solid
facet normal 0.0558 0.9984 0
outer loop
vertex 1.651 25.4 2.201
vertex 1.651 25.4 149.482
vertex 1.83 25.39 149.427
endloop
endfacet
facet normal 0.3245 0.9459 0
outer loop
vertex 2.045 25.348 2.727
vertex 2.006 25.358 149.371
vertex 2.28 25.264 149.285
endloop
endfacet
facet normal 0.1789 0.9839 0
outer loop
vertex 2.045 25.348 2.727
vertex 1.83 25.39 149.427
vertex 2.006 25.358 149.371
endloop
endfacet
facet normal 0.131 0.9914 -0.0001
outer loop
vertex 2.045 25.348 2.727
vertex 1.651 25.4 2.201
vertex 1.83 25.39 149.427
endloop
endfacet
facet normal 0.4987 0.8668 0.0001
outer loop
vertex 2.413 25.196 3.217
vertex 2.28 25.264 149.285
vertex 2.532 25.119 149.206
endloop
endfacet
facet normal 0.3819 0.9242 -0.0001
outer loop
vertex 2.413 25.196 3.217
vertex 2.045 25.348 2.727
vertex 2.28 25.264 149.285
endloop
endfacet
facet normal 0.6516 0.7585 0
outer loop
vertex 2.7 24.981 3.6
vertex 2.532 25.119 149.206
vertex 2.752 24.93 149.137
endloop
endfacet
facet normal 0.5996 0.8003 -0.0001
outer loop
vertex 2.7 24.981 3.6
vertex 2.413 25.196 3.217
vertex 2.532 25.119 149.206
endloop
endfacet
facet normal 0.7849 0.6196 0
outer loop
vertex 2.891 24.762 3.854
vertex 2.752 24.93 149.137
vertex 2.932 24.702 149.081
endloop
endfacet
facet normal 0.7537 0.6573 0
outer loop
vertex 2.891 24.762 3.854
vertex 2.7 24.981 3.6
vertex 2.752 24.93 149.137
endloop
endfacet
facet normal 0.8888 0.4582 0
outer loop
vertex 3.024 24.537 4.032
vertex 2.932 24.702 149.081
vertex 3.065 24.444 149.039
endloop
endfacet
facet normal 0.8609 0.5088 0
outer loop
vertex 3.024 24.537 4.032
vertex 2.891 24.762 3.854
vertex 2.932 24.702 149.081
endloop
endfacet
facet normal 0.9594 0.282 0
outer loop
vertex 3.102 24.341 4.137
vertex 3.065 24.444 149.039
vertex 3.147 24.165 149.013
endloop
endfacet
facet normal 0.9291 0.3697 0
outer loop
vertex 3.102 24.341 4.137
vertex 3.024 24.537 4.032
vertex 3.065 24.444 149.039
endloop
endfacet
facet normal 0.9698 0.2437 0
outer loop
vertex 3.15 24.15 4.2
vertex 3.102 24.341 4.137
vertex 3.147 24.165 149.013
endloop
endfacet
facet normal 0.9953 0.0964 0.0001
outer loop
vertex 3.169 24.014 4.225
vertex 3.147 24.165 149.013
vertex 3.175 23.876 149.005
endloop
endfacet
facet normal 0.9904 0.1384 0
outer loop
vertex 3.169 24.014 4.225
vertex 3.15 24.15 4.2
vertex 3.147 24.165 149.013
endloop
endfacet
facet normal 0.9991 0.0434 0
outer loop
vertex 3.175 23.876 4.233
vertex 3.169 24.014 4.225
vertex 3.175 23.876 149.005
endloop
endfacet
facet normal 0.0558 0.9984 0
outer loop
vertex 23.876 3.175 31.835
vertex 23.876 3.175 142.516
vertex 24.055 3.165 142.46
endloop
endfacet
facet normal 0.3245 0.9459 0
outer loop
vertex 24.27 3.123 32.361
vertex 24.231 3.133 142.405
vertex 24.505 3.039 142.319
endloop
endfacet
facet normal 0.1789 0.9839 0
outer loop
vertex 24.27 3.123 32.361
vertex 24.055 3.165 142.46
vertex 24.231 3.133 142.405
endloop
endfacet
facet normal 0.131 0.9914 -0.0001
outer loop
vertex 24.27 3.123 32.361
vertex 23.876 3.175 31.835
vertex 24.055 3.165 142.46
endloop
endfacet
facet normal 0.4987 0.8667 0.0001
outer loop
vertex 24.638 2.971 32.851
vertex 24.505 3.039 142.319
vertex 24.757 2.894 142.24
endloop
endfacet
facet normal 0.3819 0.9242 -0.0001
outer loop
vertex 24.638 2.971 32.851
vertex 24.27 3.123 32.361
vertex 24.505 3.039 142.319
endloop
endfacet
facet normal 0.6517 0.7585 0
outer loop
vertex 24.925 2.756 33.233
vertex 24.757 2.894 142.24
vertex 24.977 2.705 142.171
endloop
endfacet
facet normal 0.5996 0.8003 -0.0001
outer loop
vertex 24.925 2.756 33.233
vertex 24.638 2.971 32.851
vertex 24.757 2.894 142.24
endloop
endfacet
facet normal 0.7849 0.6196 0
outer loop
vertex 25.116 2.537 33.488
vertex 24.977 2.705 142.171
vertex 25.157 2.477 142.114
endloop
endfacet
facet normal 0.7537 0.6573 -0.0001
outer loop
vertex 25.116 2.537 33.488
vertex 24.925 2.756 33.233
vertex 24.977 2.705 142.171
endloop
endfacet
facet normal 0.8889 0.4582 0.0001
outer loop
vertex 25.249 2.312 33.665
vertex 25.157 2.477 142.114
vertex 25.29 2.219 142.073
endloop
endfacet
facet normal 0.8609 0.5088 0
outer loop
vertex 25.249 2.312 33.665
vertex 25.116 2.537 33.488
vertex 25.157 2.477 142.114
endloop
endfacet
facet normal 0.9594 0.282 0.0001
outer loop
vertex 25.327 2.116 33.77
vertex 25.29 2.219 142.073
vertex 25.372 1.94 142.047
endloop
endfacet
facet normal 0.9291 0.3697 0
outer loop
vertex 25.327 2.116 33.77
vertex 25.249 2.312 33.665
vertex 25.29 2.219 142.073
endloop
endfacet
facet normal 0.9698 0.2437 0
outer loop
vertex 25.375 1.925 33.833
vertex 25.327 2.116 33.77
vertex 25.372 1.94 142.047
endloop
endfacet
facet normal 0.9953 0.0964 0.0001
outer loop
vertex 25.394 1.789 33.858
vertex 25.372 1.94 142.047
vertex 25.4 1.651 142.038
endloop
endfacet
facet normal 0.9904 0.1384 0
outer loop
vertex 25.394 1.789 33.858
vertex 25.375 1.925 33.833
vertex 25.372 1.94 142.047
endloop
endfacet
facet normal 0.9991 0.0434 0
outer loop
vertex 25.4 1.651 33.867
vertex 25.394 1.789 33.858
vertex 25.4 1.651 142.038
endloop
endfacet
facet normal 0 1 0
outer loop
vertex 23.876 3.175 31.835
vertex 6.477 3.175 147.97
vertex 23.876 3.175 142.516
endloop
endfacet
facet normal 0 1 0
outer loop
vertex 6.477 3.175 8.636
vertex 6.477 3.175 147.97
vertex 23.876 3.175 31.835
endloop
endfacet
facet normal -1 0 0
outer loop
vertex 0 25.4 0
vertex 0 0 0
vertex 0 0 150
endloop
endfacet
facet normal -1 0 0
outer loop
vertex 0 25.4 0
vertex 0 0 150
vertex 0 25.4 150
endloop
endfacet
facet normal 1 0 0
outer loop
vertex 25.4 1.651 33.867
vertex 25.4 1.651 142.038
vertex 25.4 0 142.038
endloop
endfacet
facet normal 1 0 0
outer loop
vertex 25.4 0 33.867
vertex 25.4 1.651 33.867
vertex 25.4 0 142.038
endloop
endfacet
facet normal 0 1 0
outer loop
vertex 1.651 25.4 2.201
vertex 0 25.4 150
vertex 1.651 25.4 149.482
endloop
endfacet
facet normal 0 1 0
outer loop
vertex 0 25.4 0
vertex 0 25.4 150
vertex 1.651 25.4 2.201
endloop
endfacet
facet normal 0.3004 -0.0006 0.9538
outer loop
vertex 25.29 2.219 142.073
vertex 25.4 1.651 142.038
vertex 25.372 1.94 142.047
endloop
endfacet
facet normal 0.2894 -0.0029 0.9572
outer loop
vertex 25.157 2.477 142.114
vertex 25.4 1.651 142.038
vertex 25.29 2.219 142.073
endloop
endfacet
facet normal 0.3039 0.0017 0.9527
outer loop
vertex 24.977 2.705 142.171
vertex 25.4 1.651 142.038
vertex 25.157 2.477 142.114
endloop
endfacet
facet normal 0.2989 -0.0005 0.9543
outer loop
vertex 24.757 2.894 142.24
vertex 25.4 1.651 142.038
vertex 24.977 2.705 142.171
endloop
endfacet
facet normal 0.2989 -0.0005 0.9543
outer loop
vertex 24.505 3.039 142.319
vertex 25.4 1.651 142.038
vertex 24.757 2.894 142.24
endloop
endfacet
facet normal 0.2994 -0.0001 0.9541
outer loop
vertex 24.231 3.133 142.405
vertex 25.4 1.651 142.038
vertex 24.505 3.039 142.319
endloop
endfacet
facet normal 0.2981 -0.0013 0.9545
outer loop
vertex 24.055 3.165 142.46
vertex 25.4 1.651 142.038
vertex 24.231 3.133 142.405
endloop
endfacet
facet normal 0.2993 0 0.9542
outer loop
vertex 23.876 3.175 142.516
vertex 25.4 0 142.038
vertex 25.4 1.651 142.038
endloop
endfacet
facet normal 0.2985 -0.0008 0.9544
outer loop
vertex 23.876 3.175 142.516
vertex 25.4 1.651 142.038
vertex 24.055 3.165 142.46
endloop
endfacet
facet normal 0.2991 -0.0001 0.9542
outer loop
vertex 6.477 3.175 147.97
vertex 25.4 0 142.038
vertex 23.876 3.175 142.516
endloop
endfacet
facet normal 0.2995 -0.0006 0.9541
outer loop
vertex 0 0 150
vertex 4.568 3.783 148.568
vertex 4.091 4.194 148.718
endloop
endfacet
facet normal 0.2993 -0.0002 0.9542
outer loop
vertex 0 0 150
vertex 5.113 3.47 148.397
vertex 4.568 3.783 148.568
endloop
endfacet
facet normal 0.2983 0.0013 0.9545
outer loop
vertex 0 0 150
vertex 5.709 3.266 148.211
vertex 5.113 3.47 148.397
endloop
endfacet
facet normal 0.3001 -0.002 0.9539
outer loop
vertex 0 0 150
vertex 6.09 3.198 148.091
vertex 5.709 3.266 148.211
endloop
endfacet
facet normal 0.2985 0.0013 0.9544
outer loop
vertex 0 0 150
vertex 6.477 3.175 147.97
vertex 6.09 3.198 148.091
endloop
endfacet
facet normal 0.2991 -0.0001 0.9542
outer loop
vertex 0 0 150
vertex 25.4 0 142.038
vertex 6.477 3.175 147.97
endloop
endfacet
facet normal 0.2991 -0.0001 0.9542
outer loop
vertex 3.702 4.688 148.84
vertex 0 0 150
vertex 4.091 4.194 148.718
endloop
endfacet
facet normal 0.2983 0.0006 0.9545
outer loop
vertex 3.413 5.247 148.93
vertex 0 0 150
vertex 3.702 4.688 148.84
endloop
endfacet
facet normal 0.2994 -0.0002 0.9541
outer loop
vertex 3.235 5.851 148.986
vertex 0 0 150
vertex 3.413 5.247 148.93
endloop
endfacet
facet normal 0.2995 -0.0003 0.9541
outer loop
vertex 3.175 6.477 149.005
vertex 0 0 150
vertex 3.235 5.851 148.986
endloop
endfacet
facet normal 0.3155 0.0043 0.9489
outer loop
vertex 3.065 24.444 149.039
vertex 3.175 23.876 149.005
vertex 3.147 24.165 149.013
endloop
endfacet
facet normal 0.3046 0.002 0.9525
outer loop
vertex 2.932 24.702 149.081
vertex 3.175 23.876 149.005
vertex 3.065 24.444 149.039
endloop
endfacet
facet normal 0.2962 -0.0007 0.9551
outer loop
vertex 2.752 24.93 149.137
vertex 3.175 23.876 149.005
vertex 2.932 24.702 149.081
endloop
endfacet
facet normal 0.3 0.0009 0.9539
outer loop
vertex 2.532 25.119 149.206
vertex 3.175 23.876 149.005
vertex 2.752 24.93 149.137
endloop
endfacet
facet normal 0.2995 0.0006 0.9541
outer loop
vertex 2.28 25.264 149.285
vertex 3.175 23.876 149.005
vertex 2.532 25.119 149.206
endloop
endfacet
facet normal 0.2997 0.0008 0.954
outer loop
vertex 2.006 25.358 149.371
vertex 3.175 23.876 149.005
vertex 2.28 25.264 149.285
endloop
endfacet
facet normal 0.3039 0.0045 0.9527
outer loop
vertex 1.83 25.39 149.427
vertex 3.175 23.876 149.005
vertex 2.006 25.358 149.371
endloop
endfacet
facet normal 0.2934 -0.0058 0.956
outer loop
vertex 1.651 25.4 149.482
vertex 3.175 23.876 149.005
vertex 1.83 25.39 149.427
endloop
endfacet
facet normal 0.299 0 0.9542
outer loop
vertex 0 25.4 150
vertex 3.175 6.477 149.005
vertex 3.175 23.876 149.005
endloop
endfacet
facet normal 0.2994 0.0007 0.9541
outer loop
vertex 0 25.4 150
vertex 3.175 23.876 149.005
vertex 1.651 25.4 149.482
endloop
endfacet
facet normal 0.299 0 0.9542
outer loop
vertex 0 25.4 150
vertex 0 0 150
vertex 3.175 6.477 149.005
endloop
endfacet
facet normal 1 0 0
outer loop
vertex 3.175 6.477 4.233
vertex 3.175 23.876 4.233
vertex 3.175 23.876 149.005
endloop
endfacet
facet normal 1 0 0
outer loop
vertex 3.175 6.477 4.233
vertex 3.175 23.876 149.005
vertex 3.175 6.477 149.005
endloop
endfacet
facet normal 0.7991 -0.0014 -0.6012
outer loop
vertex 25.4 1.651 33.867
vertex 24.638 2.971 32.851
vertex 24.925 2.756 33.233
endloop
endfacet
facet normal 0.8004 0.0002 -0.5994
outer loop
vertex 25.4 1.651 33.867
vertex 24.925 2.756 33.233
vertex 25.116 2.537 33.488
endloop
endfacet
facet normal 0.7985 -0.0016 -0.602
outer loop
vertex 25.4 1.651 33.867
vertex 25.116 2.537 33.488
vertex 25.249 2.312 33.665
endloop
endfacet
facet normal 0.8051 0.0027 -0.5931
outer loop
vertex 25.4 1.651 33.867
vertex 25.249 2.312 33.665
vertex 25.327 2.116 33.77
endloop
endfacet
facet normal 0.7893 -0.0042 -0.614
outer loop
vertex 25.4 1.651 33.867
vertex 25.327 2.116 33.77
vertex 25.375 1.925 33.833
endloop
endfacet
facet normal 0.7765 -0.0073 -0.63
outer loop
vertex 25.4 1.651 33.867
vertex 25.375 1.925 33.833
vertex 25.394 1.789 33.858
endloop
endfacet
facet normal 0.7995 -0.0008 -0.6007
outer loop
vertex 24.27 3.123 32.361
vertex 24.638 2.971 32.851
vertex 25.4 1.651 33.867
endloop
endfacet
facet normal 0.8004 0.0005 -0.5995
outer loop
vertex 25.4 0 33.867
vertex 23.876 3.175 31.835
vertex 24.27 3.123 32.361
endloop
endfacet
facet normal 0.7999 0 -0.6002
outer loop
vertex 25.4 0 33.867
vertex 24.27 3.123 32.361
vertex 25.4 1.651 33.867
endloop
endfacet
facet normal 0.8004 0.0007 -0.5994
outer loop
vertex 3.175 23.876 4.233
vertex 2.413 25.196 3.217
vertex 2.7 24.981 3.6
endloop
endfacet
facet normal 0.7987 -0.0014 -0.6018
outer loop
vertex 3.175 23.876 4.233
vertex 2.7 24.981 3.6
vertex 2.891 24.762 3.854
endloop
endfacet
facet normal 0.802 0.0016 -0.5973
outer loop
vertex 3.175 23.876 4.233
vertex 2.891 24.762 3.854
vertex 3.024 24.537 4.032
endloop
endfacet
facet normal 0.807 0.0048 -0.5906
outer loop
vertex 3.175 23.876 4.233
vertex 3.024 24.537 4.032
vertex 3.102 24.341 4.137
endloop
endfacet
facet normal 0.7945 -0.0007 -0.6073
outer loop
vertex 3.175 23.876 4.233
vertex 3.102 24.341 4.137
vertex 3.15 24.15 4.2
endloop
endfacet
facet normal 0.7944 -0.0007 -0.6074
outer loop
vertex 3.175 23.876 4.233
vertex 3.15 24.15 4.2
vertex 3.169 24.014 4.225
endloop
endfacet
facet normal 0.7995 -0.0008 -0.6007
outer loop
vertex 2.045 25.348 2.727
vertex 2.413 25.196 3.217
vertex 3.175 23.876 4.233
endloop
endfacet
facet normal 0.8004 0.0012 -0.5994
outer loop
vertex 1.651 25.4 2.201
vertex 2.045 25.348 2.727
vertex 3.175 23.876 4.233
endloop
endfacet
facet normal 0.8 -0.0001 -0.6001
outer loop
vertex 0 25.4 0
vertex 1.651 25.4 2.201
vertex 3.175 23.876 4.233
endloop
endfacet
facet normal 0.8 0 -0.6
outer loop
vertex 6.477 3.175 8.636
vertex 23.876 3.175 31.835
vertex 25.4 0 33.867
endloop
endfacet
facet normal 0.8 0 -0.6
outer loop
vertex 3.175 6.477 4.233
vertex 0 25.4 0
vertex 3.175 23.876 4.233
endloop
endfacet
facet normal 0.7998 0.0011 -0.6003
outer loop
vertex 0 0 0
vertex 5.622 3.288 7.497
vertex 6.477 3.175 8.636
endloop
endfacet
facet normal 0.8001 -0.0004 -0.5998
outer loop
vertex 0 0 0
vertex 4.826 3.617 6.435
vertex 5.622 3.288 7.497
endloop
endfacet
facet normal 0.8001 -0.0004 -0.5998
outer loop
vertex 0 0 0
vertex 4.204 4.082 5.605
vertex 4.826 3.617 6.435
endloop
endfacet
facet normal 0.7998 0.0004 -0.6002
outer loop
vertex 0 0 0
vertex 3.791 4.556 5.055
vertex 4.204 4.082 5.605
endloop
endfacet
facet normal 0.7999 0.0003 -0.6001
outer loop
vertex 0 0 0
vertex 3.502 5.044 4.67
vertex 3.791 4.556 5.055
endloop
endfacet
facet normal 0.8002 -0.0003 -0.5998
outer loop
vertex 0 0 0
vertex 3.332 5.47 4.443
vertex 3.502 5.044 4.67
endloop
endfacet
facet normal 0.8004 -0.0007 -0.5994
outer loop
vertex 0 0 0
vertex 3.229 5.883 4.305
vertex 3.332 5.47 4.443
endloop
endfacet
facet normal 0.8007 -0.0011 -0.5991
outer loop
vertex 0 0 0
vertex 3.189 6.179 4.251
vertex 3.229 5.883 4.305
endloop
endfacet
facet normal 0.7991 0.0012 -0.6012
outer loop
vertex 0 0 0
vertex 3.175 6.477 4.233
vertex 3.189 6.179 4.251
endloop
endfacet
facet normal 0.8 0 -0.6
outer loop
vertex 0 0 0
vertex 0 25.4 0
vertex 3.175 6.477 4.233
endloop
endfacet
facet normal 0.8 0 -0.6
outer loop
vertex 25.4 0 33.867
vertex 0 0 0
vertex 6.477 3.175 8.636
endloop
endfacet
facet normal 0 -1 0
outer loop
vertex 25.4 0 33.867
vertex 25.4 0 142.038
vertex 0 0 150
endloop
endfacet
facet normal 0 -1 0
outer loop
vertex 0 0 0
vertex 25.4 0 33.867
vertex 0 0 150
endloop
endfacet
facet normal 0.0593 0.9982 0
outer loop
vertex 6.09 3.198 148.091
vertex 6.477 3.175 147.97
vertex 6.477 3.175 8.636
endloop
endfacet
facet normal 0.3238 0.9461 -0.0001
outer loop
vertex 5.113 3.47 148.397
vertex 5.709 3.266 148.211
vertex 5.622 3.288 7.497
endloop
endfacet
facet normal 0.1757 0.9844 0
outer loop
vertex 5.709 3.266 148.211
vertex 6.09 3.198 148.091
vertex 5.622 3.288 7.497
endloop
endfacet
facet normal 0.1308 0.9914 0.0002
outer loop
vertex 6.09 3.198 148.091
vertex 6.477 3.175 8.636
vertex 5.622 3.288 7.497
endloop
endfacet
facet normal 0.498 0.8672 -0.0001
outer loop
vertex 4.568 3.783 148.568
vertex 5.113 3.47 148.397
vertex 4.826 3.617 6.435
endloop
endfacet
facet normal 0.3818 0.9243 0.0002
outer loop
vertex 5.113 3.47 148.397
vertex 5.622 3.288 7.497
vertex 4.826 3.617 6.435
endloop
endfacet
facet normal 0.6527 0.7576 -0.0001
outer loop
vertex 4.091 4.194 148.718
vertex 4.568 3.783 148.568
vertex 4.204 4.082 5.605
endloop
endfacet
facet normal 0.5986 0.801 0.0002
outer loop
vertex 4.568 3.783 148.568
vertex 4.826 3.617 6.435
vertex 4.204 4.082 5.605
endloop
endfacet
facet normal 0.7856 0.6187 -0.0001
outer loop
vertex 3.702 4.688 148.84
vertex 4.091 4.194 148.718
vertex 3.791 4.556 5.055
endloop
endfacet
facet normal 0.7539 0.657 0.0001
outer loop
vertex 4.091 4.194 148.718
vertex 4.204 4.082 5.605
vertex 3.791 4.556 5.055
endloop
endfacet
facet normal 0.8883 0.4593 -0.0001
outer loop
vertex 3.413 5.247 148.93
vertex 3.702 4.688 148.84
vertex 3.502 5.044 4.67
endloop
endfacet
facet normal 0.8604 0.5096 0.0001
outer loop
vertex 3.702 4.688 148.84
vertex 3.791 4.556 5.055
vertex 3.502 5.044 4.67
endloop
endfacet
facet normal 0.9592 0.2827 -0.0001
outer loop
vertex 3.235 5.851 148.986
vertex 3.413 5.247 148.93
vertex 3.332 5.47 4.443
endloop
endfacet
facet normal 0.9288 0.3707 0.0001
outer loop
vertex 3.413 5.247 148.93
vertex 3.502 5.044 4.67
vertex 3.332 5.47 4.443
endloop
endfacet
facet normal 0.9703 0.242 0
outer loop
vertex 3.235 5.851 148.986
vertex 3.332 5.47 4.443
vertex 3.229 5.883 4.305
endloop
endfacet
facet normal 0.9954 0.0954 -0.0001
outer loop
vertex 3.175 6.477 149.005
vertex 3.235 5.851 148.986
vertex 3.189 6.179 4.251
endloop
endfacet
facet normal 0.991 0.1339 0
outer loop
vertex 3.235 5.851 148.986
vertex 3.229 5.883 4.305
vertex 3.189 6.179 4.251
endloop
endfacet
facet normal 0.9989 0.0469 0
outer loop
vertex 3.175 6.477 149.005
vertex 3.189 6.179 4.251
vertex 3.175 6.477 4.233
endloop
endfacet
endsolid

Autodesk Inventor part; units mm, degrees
ref_plane "Start Plane" through (0, 0, 0) normal (0, 0, 1) x (1, 0, 0)
ref_plane "End Plane" through (0, 0, 150) normal (0, 0, 1) x (1, 0, 0)
sketch "Sketch" plane through (0, 0, 0) normal (0, 0, 1) x (1, 0, 0)
  line L0 (25.4, 0) -> (0, 0)
  line L1 (0, 0) -> (0, 25.4)
  line L2 (0, 25.4) -> (1.651, 25.4)
  line L3 (3.175, 23.876) -> (3.175, 6.477)
  line L4 (6.477, 3.175) -> (23.876, 3.175)
  line L5 (25.4, 1.651) -> (25.4, 0)
  line L6 (0, -11.0414) -> (0, 31.5385) construction
  line L7 (-11.0414, 0) -> (31.5385, 0) construction
  arc A0 (3.175, 6.477) -> (6.477, 3.175) centre (6.477, 6.477) ccw
  arc A1 (3.175, 23.876) -> (1.651, 25.4) centre (1.651, 23.876) ccw
  arc A2 (25.4, 1.651) -> (23.876, 3.175) centre (23.876, 1.651) ccw
  line L8 (0, 40.0545) -> (0, -19.5574) construction
  line L9 (-19.5574, 0) -> (40.0545, 0) construction
  point P0 (3.175, 25.4)
  point P1 (3.175, 3.175)
  point P2 (25.4, 3.175)
  dimension "d0" = 25.4
  dimension "d1" = 25.4
  dimension "d2" = 3.175
  dimension "d3" = 3.175
  dimension "d10" = 0
  dimension "d11" = 0
  dimension "d14" = 3.302
  dimension "d15" = 1.524
extrude "Body" add sketch "Sketch" along normal up to surface (150 mm away) from surface at 0
sketch "Sketch3" plane through (0, 0, 0) normal (0, 0, 1) x (1, 0, 0)
  line L0 (0, 0) -> (10, 0)
ref_plane "Work Plane3" through (0, 0, 0) normal (0, -1, 0) x (1, 0, 0)
ref_plane "Work Plane4" through (0, 12.7, 150) normal (0.2991, 0, 0.9542) x (0.9542, 0, -0.2991)
split "Split1" plane through (0, 12.7, 150) removes the side toward (0.2991, 0, 0.9542)
ref_plane "Work Plane5" through (0, 690, 0) normal (0.8, 0, -0.6) x (-0.6, 0, -0.8)
split "Split2" plane through (0, 690, 0) removes the side toward (0.8, 0, -0.6)
sketch "Sketch4" plane through (0, 0, 0) normal (0, -1, 0) x (1, 0, 0)
  line L0 (-2, 0) -> (12, 0) projected
  line L1 (-2, 150) -> (12, 150) projected
  dimension "d17" = 150
equation "\"d0\" = G_H"
equation "\"d1\" = G_H"
equation "\"d2\" = G_T"
equation "\"d3\" = G_T"
equation "\"d14\" = G_IR"
equation "\"d15\" = G_ER"
equation "\"d4\" = G_L"
equation "\"G_H\" = 25.4"
equation "\"G_T\" = 3.175"
equation "\"G_ER\" = 1.524"
equation "\"G_IR\" = 3.302"
equation "\"G_L\" = d17"
equation "\"ex\" = 0"
equation "\"G_OFFSET_START\" = 0"
equation "\"G_OFFSET_END\" = 0"
equation "\"d13\" = G_OFFSET_END + B_L"
equation "\"B_L\" = 150"
properties part number "AISC - L 1 x 1 x 1/8 - 5.906" material "Steel, Mild"
